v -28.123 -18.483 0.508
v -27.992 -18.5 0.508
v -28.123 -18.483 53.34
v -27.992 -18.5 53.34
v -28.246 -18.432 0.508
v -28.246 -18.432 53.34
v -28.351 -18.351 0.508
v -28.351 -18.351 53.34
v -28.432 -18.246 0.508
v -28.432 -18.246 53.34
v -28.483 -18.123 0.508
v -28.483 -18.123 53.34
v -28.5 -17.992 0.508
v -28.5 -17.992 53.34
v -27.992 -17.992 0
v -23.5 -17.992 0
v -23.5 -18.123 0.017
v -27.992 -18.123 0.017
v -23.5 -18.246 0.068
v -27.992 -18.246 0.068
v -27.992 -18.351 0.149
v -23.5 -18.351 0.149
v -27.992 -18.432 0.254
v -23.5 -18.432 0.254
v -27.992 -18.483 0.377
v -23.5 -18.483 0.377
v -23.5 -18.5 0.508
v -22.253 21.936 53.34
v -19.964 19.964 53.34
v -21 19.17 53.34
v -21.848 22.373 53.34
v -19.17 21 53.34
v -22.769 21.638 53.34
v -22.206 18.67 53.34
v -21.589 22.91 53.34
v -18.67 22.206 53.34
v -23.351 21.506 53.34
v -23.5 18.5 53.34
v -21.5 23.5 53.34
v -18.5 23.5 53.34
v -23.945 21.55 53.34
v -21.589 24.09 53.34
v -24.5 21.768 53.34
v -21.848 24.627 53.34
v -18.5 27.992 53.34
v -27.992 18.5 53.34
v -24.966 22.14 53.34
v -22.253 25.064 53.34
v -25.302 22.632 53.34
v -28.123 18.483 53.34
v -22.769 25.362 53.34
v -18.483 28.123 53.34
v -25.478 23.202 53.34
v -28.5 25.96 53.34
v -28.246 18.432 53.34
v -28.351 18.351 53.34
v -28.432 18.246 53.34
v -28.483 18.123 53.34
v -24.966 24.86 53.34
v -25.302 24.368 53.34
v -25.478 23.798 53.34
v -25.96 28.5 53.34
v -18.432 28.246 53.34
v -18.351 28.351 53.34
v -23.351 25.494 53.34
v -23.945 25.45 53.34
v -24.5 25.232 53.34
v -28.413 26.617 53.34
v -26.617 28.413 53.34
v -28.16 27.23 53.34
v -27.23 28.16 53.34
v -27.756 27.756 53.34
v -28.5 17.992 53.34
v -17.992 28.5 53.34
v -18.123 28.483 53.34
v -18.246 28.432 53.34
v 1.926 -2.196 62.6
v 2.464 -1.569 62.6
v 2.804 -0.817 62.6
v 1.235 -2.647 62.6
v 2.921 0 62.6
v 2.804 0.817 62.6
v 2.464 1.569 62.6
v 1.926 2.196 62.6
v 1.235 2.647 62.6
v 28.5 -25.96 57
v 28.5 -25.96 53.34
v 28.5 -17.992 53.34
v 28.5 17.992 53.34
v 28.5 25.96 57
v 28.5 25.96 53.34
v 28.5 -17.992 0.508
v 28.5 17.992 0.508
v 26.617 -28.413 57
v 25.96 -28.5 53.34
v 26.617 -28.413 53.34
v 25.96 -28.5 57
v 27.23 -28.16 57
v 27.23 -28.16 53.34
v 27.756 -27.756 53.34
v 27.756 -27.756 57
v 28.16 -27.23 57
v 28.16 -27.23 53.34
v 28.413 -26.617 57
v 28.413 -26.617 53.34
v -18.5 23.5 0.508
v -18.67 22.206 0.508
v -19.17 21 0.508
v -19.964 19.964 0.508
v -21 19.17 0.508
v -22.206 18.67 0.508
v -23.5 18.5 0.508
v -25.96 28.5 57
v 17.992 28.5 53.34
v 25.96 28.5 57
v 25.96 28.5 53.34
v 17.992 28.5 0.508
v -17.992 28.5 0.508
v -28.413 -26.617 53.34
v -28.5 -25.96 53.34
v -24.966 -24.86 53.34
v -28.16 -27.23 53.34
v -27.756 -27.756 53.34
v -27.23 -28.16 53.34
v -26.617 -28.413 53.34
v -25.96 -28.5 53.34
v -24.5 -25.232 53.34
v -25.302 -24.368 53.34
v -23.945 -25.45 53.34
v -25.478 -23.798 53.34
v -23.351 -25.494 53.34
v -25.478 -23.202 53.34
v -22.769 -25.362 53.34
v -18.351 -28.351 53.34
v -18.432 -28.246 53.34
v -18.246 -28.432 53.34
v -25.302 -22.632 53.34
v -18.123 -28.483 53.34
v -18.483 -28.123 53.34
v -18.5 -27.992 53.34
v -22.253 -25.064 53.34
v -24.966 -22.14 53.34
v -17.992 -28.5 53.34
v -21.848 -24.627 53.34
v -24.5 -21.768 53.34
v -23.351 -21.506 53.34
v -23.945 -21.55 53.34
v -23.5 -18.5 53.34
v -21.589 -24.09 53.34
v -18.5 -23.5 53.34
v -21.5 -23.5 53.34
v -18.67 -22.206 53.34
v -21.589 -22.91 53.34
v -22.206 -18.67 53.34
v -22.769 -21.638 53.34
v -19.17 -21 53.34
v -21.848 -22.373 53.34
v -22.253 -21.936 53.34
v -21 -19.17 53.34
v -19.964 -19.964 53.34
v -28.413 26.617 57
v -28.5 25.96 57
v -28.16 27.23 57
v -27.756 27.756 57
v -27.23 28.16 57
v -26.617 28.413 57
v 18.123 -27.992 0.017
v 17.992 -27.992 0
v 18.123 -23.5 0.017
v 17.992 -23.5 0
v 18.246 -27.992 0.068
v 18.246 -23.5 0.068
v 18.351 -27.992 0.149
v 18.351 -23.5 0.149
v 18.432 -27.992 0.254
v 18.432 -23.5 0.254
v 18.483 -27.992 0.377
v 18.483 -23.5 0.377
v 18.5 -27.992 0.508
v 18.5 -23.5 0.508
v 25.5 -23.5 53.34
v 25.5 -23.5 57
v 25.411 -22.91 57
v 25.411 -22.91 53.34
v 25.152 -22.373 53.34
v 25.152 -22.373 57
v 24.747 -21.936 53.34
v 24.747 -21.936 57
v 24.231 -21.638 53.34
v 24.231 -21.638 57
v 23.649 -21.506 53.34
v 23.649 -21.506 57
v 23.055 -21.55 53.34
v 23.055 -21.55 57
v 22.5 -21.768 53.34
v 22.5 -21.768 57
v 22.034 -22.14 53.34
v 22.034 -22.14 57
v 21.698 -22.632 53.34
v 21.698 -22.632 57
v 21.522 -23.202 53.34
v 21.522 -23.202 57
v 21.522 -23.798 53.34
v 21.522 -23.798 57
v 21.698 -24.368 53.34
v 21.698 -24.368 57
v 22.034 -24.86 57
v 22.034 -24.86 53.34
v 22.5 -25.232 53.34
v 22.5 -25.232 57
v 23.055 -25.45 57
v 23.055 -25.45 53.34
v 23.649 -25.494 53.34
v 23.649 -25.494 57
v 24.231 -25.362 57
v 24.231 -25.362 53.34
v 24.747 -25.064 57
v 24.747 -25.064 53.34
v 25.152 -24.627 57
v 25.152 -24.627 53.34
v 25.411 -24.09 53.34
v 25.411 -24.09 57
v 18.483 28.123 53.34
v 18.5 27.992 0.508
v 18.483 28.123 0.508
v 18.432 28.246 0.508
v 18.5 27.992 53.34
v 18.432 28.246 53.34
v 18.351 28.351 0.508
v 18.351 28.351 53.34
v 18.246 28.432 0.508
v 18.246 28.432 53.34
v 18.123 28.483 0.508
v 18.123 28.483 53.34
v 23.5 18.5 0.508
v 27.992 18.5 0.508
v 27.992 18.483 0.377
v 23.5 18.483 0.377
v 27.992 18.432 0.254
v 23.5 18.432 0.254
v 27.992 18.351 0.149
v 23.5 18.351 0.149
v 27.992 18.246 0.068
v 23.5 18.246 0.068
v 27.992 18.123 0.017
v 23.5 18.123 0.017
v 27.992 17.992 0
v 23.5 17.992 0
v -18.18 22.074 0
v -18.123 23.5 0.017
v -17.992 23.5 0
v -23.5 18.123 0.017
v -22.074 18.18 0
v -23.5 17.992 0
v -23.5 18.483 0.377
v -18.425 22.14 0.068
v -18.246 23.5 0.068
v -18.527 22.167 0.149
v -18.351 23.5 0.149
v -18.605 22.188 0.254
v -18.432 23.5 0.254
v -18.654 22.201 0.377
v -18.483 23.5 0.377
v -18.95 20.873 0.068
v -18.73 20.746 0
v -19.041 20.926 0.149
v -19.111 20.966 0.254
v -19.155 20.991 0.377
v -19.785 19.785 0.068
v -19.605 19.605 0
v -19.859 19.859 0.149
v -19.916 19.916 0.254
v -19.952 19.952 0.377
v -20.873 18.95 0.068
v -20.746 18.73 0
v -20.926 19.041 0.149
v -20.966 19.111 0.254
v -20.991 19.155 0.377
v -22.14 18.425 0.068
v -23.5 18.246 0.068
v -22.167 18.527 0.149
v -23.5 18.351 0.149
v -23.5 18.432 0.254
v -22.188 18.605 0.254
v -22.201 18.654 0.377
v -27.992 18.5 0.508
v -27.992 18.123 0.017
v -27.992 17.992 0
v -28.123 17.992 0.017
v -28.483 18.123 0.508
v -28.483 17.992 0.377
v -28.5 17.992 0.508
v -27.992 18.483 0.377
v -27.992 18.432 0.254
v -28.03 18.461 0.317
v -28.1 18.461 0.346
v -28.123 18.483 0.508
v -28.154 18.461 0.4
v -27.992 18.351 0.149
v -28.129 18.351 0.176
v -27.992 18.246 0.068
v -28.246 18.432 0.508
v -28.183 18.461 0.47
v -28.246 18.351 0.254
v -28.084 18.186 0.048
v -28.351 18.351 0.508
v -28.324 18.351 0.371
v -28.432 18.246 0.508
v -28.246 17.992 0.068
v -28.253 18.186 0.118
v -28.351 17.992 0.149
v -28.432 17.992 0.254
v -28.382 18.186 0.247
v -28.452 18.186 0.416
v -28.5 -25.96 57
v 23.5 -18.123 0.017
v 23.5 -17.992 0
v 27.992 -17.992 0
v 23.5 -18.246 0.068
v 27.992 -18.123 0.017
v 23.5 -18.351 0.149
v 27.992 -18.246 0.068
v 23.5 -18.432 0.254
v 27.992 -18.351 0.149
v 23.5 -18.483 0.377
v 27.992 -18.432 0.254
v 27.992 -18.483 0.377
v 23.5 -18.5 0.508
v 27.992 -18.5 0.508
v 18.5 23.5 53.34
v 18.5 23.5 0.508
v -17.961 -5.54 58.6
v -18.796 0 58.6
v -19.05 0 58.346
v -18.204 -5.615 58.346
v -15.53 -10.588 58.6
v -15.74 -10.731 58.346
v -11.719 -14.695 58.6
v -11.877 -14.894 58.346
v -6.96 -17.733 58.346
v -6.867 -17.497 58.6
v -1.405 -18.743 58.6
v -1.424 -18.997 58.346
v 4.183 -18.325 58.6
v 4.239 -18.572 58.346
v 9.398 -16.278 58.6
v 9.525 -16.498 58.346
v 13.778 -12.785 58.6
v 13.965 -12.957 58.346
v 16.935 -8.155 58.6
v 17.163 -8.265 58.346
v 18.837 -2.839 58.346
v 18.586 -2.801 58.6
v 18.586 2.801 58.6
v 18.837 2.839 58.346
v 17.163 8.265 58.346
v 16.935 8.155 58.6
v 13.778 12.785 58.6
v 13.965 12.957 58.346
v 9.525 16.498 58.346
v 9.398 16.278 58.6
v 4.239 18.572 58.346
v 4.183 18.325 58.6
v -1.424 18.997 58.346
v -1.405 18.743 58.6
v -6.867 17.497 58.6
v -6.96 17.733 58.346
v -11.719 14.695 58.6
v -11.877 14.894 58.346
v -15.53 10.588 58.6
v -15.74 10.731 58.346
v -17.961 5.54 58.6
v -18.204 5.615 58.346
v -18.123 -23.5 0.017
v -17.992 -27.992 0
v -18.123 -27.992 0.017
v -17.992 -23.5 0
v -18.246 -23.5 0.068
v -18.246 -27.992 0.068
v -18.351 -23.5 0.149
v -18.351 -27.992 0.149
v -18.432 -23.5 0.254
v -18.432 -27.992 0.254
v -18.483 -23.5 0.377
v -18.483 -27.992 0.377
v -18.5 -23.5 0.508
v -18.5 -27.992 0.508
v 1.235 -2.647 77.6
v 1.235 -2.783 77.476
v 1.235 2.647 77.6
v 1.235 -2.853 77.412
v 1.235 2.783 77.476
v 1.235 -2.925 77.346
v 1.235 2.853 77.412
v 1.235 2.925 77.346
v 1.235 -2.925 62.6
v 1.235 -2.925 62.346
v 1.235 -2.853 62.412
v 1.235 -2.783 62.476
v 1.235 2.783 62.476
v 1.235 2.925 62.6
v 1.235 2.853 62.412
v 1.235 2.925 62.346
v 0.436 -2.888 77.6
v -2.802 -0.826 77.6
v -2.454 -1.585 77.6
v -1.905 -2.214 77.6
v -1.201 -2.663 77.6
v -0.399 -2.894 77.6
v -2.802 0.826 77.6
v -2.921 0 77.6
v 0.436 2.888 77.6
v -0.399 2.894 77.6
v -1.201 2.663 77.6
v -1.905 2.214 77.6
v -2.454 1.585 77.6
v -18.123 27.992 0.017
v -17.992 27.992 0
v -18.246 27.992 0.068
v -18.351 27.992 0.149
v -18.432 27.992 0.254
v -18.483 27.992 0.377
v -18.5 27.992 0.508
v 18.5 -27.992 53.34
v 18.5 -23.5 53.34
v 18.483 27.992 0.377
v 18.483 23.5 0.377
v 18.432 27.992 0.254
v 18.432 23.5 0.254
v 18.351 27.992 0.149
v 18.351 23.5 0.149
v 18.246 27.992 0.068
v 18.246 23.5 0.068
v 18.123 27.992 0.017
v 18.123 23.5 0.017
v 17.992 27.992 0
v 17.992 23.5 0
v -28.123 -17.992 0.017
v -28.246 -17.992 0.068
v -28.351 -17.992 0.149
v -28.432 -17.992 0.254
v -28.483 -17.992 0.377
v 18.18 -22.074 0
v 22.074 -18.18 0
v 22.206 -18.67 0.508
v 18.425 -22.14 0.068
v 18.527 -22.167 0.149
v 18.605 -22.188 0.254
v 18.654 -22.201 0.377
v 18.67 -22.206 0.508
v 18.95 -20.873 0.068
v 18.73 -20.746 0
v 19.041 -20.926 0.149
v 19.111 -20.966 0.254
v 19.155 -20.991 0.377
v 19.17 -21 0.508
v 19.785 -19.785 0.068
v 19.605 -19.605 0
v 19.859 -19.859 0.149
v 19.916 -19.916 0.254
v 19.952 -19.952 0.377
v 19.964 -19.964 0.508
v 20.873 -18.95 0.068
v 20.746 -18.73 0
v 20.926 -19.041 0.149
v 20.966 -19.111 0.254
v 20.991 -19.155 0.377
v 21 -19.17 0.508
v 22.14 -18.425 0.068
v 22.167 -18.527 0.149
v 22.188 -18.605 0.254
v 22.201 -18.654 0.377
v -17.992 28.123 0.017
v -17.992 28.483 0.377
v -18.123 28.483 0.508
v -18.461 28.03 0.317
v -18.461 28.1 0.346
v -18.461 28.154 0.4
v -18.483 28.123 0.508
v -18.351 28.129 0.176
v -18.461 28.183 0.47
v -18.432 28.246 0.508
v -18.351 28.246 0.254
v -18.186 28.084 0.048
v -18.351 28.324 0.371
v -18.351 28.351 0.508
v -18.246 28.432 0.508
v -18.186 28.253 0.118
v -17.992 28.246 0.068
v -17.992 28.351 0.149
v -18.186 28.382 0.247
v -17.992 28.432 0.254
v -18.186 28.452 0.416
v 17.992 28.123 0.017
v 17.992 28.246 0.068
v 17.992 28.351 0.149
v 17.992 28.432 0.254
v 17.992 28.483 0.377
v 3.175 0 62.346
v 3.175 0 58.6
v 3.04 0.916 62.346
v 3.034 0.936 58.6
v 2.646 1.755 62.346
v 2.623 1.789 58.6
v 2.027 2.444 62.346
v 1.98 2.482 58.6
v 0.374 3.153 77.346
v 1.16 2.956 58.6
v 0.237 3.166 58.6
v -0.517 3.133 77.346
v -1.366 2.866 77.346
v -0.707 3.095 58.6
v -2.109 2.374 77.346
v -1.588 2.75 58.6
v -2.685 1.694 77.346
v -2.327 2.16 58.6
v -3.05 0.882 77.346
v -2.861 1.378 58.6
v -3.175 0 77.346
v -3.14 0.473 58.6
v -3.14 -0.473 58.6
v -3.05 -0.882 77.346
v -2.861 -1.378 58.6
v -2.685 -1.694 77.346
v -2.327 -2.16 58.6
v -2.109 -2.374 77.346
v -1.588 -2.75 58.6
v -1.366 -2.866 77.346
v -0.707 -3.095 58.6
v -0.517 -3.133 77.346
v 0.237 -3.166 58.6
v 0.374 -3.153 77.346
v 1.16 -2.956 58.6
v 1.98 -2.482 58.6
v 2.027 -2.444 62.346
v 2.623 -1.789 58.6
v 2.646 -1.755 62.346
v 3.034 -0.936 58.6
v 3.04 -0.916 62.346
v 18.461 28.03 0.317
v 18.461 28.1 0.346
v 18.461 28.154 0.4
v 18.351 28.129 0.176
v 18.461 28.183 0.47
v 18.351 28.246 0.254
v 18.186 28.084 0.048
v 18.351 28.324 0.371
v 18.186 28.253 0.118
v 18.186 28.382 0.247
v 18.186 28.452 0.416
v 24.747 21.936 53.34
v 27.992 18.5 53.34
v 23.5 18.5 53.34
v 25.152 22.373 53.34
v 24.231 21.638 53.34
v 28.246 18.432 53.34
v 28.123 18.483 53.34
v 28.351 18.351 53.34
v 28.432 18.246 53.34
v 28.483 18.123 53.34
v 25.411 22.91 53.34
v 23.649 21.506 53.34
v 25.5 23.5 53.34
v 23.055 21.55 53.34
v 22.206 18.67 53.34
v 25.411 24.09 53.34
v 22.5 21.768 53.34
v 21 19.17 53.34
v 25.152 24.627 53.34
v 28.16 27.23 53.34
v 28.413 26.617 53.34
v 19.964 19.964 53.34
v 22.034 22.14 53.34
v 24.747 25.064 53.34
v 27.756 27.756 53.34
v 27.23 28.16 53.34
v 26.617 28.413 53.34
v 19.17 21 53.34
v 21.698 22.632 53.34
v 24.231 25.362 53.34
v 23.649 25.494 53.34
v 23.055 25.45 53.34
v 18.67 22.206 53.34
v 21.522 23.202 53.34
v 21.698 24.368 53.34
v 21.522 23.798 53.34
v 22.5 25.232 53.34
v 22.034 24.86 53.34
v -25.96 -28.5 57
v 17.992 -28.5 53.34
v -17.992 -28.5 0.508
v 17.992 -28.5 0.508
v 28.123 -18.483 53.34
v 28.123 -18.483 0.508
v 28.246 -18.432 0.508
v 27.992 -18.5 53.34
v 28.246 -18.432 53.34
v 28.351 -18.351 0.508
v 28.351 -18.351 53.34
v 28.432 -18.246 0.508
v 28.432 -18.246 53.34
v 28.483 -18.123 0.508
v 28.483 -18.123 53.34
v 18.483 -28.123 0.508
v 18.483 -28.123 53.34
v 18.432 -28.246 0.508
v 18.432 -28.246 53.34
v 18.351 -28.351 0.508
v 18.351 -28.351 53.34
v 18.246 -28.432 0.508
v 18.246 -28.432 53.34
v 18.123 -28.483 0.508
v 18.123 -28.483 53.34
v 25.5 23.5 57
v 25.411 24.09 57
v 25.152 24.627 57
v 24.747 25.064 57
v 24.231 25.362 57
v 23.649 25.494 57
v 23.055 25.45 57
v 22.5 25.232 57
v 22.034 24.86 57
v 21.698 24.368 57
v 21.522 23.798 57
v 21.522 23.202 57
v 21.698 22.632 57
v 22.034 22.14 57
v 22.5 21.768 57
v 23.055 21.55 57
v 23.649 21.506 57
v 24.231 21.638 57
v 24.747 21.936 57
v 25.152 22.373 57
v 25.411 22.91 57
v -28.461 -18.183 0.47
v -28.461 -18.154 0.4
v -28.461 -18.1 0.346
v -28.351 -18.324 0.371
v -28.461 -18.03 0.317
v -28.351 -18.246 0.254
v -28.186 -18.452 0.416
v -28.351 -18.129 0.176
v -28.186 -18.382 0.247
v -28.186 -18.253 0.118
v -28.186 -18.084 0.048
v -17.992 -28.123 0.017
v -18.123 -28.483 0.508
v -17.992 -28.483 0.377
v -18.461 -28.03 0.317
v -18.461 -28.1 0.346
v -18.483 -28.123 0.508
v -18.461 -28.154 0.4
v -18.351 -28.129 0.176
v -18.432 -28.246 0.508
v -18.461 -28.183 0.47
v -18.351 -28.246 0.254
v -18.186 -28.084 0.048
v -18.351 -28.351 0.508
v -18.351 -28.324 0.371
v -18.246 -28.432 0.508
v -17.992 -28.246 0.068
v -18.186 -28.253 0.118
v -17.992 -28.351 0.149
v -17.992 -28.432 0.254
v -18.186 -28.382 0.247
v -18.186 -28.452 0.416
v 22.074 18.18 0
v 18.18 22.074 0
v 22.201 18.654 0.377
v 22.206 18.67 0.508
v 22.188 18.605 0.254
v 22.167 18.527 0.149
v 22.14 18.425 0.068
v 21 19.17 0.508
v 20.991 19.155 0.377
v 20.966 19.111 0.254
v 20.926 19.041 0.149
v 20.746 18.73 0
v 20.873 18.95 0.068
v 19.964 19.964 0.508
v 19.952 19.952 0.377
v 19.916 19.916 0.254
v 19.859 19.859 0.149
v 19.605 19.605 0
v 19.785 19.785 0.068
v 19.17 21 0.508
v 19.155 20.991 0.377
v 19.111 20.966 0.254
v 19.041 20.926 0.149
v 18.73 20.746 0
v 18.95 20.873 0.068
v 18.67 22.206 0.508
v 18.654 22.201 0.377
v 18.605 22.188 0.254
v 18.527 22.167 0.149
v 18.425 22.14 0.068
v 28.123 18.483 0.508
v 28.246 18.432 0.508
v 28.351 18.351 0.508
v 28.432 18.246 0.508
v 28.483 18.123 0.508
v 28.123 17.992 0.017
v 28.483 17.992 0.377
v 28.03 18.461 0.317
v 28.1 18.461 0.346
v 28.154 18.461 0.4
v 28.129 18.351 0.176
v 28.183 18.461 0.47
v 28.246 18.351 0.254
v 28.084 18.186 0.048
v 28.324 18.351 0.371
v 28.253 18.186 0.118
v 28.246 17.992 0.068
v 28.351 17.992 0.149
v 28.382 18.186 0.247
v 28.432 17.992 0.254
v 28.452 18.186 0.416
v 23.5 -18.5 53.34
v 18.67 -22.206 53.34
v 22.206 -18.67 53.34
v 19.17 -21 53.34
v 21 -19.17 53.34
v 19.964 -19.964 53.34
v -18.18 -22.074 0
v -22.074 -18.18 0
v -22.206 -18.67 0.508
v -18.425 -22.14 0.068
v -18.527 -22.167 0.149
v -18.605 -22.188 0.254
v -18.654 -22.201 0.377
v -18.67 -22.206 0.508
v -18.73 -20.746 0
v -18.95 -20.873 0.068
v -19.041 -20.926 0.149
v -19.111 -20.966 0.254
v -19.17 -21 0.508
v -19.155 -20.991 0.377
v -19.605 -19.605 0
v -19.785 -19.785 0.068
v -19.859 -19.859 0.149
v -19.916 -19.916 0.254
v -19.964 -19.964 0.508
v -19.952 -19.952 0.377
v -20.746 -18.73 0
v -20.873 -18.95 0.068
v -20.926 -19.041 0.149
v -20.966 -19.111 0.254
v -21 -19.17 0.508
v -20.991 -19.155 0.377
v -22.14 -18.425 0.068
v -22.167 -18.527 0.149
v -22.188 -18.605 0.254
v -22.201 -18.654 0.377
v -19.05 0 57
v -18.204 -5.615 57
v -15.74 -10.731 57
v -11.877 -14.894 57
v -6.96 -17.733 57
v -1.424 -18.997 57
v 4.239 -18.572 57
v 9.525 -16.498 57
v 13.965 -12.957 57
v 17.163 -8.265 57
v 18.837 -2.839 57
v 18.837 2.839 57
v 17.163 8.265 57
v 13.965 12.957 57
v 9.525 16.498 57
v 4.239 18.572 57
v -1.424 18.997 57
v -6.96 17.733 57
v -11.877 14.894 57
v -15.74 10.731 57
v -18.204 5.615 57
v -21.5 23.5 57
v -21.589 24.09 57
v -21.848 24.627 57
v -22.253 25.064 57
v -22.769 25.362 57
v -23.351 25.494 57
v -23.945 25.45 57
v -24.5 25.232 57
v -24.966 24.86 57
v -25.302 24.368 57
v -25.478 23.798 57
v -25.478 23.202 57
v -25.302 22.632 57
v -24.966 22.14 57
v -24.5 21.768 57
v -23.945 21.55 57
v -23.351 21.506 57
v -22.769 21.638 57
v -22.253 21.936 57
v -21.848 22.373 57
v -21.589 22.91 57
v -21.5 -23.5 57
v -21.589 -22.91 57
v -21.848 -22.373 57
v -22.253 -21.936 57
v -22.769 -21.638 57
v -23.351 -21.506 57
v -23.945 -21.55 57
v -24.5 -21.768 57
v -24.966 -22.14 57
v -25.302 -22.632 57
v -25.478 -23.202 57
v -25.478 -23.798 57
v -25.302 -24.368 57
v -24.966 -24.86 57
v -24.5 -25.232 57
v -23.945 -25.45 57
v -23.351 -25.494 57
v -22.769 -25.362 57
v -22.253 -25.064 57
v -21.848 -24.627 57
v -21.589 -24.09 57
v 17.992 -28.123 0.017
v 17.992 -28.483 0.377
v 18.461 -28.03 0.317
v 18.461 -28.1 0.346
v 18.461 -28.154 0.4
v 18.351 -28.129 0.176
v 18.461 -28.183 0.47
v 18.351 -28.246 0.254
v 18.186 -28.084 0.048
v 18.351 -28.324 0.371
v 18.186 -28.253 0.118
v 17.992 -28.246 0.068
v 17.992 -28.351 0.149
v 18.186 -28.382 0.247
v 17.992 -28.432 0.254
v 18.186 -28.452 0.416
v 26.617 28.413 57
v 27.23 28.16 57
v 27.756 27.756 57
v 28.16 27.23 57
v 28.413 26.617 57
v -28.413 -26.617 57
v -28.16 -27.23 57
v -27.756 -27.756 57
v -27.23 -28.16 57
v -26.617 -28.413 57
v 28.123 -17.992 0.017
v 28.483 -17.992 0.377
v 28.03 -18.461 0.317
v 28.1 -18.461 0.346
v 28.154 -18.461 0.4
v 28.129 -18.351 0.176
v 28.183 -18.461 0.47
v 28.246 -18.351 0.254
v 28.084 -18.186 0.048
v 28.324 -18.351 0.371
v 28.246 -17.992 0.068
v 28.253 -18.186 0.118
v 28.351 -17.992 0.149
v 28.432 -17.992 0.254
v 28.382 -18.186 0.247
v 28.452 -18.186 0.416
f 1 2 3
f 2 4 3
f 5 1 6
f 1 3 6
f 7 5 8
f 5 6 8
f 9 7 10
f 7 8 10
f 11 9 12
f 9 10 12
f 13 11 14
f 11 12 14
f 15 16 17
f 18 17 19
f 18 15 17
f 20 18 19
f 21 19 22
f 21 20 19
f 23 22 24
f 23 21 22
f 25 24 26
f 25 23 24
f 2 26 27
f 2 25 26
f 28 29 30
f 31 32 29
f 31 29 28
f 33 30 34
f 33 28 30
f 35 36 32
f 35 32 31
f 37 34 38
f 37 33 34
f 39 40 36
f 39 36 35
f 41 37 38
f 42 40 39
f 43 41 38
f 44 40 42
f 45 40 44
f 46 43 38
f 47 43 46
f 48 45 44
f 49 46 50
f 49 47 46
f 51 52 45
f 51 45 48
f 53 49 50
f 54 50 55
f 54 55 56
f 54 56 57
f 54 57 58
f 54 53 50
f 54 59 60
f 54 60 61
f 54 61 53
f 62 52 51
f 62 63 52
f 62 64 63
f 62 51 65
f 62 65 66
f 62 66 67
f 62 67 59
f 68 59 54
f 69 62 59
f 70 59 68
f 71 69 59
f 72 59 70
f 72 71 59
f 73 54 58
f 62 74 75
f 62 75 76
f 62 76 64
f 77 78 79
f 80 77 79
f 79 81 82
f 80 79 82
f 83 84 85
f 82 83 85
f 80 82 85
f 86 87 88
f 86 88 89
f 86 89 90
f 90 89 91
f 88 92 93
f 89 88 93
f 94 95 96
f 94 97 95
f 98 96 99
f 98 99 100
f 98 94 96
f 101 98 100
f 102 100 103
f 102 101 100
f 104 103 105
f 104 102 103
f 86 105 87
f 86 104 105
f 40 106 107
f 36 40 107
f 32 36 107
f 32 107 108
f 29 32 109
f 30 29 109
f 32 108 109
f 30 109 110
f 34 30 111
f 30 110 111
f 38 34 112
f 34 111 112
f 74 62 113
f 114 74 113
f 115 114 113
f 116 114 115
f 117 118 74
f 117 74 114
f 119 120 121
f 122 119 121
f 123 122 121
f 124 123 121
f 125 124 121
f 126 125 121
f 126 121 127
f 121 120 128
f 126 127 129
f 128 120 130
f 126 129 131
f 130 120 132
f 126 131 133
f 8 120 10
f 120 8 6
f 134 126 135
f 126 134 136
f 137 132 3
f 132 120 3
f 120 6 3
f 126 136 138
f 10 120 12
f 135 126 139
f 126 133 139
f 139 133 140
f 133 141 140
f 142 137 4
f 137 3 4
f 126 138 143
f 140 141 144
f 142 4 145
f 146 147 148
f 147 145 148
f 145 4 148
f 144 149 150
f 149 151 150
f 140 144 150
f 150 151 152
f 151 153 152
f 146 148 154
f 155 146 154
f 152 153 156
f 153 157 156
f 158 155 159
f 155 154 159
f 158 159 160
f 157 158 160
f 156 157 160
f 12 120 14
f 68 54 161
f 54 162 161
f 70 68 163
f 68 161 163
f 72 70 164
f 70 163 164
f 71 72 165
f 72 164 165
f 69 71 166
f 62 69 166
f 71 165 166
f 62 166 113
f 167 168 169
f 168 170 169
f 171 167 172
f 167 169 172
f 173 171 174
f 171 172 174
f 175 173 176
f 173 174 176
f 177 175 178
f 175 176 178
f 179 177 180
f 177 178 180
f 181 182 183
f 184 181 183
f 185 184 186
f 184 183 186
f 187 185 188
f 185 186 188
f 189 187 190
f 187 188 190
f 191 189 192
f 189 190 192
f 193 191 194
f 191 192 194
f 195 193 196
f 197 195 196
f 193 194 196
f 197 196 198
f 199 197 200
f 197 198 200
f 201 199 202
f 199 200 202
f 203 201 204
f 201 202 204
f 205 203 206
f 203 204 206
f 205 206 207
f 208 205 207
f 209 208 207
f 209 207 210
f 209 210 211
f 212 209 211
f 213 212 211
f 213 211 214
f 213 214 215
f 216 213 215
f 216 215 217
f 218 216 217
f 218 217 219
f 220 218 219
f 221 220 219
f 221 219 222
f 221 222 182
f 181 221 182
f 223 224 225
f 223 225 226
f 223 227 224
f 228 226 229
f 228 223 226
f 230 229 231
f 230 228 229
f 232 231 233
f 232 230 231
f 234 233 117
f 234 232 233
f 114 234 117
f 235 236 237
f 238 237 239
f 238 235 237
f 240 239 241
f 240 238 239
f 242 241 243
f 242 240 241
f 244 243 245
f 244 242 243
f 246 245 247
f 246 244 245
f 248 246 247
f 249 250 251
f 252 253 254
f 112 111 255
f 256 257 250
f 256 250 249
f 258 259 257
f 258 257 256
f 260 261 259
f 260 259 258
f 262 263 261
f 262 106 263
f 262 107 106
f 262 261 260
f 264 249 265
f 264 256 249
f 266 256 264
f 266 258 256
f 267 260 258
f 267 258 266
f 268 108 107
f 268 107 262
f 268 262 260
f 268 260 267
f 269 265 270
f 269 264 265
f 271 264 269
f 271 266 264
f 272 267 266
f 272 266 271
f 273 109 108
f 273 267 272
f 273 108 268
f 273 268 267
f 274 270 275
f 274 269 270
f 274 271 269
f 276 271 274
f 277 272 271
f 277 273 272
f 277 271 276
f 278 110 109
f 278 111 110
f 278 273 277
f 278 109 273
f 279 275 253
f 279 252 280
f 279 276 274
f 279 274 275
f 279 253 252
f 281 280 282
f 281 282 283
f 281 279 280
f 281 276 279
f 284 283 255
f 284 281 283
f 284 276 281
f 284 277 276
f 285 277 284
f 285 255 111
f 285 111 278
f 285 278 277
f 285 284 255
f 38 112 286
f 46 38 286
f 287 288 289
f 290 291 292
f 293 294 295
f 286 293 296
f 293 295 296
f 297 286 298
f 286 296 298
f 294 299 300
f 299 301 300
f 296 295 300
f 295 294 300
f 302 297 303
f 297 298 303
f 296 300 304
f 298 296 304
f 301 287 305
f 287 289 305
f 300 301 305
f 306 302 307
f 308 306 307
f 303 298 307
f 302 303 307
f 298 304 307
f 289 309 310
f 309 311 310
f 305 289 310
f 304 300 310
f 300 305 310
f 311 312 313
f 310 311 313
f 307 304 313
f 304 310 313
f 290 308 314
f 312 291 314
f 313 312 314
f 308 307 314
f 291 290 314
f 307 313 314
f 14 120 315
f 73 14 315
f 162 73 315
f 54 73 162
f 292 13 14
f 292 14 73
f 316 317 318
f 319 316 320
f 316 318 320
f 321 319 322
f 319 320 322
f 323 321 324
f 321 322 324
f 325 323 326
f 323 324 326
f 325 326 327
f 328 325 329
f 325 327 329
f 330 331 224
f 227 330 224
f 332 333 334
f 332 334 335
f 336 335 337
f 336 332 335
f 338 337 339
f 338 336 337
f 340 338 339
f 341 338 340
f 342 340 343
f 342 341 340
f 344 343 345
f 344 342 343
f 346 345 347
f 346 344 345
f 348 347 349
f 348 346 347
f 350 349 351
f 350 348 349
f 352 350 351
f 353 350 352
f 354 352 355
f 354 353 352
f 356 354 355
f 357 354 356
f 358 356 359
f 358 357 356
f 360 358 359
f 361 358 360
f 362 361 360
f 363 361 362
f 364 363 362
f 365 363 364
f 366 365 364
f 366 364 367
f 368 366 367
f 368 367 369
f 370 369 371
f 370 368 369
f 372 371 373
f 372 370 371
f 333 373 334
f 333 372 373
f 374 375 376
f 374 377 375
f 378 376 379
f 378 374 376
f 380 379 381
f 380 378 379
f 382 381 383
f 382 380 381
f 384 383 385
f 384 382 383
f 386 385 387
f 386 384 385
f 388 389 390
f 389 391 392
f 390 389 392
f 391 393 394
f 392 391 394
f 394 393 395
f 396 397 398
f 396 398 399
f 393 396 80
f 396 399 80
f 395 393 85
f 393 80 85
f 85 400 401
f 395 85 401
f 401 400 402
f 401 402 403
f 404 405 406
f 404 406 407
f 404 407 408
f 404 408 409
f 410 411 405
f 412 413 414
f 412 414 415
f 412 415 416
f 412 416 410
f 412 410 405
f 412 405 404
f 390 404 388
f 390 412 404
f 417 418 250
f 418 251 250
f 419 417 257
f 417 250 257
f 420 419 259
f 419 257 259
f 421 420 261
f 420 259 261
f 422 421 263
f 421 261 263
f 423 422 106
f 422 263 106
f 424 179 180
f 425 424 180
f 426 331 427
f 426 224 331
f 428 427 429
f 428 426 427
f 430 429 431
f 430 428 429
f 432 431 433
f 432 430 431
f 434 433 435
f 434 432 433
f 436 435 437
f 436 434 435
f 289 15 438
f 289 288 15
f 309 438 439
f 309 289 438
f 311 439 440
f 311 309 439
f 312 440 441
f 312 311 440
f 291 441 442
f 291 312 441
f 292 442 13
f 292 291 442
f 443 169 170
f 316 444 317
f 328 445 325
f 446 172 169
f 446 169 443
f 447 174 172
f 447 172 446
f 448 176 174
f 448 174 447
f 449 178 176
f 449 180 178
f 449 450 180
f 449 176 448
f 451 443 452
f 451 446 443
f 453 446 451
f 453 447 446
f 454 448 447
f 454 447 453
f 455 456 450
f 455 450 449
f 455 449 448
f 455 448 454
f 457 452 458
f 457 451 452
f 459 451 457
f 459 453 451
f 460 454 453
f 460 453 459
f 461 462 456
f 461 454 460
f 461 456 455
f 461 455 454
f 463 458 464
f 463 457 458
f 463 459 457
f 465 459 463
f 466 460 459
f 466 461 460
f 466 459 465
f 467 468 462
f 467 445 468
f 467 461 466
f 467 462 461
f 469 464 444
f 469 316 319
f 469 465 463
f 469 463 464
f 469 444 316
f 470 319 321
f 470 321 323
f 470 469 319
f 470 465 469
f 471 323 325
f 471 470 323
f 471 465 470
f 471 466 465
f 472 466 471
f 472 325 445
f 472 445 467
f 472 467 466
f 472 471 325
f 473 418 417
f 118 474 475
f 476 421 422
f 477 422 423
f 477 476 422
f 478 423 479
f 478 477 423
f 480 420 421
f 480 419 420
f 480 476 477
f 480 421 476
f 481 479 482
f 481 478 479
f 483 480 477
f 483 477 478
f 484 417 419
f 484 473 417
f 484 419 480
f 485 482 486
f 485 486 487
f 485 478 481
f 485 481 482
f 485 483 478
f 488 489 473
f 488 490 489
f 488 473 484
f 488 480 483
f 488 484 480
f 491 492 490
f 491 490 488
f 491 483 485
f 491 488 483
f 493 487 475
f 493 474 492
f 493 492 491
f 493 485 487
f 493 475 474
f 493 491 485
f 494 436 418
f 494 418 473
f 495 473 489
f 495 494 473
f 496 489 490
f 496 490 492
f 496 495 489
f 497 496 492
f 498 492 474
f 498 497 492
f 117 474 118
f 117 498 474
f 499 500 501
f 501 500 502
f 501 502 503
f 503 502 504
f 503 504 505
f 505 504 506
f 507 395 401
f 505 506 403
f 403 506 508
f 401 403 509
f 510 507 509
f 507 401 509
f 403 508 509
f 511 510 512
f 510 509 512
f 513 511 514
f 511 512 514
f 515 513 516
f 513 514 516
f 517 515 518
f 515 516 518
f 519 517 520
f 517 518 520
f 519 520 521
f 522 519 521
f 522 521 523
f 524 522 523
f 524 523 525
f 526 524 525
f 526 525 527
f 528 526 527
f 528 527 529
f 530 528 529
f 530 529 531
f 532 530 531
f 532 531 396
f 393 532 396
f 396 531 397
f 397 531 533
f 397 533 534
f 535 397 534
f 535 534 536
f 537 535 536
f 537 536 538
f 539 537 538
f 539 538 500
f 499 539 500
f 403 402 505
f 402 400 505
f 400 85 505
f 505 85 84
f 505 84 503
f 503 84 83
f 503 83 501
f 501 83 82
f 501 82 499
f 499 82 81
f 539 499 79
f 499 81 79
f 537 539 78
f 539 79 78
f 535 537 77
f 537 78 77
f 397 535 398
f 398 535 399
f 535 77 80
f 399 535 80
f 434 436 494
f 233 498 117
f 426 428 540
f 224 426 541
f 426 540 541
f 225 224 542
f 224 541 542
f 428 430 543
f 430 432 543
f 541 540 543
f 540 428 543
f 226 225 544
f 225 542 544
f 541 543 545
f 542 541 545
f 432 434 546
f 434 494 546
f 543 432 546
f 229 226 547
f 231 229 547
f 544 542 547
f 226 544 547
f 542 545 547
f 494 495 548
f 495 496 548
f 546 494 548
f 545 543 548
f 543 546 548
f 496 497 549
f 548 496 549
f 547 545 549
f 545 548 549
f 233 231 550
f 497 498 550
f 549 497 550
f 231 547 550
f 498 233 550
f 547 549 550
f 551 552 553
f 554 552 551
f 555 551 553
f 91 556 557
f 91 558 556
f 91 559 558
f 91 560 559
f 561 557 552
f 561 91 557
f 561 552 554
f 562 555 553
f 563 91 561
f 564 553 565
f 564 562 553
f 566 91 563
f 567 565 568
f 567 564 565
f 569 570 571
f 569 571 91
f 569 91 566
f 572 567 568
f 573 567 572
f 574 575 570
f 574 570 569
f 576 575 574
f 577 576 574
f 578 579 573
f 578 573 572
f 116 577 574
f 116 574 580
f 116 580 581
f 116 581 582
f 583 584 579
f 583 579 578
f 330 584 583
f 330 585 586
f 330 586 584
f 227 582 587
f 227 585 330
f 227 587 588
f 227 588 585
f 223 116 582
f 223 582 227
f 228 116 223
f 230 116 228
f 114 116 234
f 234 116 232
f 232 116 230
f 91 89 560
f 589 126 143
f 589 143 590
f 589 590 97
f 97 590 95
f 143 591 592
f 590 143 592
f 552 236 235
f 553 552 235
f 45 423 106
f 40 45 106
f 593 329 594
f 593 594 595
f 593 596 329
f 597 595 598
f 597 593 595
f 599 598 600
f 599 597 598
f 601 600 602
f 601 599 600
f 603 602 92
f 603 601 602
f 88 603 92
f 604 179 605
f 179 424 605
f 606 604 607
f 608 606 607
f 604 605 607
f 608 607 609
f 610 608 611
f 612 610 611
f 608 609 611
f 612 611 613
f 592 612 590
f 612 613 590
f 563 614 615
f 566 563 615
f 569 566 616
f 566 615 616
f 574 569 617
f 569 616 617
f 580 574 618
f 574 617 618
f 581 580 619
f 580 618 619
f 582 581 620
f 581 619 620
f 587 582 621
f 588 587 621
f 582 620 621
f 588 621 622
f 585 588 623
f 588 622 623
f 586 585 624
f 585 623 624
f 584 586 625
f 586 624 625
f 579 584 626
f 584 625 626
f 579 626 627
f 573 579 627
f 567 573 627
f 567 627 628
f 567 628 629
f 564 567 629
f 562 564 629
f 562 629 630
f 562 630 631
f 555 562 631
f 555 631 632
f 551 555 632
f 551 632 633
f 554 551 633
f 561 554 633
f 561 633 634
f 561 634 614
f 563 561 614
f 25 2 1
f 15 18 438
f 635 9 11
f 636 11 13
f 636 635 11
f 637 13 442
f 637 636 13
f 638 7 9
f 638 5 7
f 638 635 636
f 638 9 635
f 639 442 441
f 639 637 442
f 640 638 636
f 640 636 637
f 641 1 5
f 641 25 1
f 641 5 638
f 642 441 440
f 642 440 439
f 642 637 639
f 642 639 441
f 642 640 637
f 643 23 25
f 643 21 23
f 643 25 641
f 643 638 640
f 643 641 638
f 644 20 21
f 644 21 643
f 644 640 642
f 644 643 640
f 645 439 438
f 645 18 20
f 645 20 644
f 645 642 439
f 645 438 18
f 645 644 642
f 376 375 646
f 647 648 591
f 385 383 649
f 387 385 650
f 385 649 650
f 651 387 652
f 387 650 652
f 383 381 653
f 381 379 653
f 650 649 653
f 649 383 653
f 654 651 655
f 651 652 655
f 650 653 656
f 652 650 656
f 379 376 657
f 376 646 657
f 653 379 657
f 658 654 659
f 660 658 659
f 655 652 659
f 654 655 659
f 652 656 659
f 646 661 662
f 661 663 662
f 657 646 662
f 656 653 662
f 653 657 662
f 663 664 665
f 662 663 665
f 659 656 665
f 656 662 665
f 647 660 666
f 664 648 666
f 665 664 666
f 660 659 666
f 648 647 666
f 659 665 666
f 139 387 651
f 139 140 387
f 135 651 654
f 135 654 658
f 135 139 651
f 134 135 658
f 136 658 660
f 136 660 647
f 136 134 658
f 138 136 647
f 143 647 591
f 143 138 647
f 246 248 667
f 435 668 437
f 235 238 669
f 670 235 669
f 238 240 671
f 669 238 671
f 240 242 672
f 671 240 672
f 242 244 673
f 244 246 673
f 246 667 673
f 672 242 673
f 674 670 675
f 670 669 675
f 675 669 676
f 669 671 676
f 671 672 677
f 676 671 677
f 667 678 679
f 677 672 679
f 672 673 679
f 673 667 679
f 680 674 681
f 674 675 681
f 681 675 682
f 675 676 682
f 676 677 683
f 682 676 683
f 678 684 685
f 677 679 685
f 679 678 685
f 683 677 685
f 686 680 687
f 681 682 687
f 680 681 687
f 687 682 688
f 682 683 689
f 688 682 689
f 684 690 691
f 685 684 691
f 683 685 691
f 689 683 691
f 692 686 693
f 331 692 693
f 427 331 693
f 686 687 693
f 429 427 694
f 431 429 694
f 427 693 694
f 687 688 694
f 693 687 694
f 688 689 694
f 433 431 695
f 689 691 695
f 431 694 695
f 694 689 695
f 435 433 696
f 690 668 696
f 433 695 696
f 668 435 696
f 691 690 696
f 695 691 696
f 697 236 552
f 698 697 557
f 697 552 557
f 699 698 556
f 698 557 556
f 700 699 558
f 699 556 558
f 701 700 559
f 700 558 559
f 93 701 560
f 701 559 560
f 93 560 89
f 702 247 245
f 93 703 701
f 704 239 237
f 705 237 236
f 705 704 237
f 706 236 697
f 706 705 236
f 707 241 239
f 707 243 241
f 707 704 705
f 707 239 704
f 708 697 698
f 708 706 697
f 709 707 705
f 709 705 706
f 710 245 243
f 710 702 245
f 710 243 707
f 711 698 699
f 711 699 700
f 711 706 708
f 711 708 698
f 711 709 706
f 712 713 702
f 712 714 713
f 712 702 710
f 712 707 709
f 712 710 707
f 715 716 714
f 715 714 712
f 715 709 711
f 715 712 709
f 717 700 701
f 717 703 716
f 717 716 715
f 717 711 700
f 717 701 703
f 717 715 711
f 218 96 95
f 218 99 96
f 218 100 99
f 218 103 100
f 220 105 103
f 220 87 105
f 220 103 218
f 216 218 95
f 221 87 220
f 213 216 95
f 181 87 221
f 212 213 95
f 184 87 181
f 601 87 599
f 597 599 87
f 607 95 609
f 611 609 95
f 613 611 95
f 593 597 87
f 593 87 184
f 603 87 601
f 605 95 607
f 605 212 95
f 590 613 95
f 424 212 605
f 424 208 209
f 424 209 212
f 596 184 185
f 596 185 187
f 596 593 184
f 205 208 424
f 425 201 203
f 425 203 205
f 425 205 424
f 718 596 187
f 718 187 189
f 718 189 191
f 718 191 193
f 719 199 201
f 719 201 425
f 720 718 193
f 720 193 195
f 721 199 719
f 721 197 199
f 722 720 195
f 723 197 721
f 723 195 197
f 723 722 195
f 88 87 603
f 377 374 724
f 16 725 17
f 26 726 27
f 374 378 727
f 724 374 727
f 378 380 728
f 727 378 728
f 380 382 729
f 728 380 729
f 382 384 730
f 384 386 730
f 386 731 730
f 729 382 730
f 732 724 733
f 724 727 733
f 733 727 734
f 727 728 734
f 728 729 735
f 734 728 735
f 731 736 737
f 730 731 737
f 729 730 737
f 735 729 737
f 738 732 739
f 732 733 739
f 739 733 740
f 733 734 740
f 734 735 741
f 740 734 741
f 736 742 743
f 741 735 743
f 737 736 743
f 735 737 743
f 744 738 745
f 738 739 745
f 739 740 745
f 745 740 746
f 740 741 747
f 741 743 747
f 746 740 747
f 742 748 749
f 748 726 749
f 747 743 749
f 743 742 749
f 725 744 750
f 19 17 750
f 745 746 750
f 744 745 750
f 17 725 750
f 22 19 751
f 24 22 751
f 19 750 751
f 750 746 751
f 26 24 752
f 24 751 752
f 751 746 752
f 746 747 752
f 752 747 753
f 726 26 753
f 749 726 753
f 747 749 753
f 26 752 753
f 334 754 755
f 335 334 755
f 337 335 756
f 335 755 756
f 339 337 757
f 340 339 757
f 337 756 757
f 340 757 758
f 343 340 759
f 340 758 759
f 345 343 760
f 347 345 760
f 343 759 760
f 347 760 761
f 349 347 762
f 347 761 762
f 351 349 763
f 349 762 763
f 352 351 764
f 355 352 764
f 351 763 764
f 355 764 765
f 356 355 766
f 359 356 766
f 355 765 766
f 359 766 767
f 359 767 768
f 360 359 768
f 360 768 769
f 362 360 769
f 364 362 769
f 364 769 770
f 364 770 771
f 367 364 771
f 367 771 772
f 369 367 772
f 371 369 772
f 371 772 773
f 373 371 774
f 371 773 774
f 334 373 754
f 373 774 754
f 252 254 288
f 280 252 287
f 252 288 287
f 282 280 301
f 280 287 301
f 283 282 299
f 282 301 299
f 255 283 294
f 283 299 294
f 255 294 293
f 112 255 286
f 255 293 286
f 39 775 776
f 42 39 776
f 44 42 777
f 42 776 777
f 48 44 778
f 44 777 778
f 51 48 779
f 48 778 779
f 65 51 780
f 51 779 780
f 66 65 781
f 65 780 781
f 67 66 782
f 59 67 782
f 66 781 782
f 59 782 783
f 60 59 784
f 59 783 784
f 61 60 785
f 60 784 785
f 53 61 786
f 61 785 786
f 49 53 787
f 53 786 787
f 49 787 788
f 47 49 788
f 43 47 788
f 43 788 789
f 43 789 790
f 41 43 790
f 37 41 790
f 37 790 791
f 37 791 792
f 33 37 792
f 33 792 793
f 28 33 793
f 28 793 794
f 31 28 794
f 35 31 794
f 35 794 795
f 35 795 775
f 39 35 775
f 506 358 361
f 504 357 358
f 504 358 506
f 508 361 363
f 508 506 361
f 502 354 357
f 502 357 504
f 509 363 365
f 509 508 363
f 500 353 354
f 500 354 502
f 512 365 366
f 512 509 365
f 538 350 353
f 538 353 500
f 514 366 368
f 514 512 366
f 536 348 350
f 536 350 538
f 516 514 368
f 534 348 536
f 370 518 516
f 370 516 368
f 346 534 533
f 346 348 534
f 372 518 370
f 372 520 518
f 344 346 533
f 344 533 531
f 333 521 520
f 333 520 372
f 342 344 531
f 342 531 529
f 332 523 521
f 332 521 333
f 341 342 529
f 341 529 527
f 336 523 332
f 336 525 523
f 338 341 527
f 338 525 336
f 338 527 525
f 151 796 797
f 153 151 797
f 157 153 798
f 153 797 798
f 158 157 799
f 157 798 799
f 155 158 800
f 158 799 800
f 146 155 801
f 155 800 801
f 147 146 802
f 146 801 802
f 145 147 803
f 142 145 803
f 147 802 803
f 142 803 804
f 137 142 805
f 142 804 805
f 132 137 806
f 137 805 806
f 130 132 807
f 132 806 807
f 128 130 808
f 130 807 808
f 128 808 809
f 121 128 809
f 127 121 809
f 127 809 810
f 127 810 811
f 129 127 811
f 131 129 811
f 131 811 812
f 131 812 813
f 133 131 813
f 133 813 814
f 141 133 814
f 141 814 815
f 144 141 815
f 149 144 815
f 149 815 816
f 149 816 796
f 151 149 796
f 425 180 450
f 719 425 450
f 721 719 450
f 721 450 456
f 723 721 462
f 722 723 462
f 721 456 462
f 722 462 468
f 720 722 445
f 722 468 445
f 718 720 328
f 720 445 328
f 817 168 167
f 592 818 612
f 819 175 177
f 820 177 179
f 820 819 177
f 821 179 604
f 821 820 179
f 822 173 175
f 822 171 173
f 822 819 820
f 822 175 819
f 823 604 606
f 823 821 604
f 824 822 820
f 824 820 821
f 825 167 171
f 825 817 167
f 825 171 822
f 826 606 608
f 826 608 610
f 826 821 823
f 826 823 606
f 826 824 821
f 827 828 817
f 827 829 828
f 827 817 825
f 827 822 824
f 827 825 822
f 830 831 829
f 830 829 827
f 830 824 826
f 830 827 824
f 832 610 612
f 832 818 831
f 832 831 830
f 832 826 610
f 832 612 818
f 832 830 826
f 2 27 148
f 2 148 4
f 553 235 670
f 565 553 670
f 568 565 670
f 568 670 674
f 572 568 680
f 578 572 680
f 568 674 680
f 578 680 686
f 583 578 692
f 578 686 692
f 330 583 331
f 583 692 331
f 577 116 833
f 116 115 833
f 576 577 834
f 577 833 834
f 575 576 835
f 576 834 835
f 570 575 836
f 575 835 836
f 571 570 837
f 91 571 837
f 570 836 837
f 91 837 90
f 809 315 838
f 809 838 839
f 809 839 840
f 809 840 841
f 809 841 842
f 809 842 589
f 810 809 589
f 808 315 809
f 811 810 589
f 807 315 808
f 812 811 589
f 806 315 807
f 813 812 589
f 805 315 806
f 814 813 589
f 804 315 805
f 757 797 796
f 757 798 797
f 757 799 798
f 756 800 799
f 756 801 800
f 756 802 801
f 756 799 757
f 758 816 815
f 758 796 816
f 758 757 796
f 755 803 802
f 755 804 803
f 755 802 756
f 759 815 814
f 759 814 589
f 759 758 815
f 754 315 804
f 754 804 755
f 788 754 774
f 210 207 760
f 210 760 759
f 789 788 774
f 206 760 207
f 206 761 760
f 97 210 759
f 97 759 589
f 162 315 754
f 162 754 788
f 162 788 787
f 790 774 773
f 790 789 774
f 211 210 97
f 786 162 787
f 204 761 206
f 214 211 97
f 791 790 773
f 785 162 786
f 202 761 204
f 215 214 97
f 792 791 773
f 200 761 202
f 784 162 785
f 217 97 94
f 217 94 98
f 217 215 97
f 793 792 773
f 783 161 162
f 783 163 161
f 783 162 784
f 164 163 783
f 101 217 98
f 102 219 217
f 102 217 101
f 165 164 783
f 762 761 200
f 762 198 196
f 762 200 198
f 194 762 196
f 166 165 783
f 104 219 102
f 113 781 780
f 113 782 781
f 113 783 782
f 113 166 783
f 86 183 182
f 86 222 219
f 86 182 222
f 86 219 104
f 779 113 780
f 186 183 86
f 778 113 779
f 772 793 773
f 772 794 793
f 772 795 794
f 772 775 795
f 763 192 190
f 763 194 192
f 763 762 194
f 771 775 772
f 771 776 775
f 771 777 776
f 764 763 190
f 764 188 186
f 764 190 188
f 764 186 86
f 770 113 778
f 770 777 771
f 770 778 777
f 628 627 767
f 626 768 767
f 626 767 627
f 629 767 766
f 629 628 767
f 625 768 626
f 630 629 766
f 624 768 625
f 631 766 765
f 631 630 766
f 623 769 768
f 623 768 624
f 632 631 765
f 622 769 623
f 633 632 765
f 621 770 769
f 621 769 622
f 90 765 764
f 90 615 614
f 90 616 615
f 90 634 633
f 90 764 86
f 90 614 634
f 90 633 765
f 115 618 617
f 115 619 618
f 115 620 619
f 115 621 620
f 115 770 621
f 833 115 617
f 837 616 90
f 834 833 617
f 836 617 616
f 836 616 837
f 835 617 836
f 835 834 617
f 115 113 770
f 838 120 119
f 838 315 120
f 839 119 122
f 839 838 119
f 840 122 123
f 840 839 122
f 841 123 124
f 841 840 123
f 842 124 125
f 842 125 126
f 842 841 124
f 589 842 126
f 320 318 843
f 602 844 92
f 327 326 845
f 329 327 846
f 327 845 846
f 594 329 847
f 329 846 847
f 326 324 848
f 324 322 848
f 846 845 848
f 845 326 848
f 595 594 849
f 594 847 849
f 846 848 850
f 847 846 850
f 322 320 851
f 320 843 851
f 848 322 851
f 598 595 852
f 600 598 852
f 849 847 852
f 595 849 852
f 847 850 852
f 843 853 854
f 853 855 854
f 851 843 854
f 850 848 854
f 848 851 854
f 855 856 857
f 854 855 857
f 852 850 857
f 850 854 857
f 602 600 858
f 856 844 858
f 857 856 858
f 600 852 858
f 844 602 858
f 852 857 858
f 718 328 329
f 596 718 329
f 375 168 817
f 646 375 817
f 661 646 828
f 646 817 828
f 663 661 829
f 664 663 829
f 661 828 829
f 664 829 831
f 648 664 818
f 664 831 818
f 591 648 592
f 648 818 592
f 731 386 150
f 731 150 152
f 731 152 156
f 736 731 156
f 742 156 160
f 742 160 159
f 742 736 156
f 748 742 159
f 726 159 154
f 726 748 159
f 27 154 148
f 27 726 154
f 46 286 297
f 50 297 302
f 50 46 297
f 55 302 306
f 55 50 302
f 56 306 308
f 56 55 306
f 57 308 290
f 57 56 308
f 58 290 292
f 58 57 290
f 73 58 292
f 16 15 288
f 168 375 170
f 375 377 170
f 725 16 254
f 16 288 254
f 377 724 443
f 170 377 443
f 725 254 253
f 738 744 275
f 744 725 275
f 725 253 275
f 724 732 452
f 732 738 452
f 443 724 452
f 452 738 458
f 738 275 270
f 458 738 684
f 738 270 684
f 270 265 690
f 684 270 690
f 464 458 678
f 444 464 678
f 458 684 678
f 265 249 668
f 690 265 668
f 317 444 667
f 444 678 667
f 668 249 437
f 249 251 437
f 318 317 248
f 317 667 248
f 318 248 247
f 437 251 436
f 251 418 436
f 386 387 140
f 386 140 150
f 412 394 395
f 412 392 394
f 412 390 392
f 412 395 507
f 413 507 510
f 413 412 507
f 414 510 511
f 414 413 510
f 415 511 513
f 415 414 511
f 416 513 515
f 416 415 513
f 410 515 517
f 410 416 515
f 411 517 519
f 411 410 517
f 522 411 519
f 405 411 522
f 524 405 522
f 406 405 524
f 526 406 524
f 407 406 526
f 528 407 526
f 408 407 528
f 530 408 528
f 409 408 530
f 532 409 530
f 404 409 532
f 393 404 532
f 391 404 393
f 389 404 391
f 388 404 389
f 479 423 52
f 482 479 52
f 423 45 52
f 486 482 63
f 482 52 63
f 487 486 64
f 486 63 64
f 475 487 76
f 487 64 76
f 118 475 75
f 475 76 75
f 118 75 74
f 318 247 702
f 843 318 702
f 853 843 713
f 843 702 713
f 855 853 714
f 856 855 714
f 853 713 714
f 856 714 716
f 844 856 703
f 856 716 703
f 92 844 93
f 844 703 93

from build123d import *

# Parameters (mm, degrees)
SKETCH1_W           = 57
SKETCH1_H           = 57
BOSS_EXTRUDE1_DEPTH = 57
SKETCH2_R           = 2
CUT_EXTRUDE1_DEPTH  = 70.810457669
CUT_EXTRUDE4_DEPTH  = 53.34
FILLET1_R           = 2.54
SKETCH9_R           = 19.05
BOSS_EXTRUDE2_DEPTH = 1.6
SKETCH10_R          = 3.175
BOSS_EXTRUDE3_DEPTH = 19
CUT_EXTRUDE5_START  = -15
CUT_EXTRUDE5_DEPTH  = 15
CHAMFER1_SIZE       = 0.254
FILLET2_R           = 0.508


with BuildPart() as part:
    # Sketch1 → Boss-Extrude1 (new body)
    with BuildSketch(Plane.XY):
        Rectangle(SKETCH1_W, SKETCH1_H)
    extrude(amount=BOSS_EXTRUDE1_DEPTH)

    # Sketch2 → Cut-Extrude1 (cut, through all)
    with BuildSketch(Plane.XY.offset(57)):
        with Locations((-23.5, 23.5)):
            Circle(SKETCH2_R)
        with Locations((23.5, 23.5)):
            Circle(SKETCH2_R)
        with Locations((23.5, -23.5)):
            Circle(SKETCH2_R)
        with Locations((-23.5, -23.5)):
            Circle(SKETCH2_R)
    extrude(amount=-CUT_EXTRUDE1_DEPTH, mode=Mode.SUBTRACT)

    # Sketch8 → Cut-Extrude4 (cut)
    with BuildSketch(Plane(origin=(0, 0, 0), x_dir=(-1, 0, 0), z_dir=(0, 0, -1))):
        with BuildLine():
            Line((18.5, -28.5), (18.5, -23.5))
            ThreePointArc((18.5, -23.5), (19.964466094, -19.964466094), (23.5, -18.5))
            Line((23.5, -18.5), (28.5, -18.5))
            Line((28.5, -18.5), (28.5, -28.5))
            Line((28.5, -28.5), (18.5, -28.5))
        make_face()
        with BuildLine():
            Line((23.5, 18.5), (28.5, 18.5))
            Line((28.5, 18.5), (28.5, 28.5))
            Line((28.5, 28.5), (18.5, 28.5))
            Line((18.5, 28.5), (18.5, 23.5))
            ThreePointArc((18.5, 23.5), (19.964466094, 19.964466094), (23.5, 18.5))
        make_face()
        with BuildLine():
            Line((-18.5, 23.5), (-18.5, 28.5))
            Line((-18.5, 28.5), (-28.5, 28.5))
            Line((-28.5, 28.5), (-28.5, 18.5))
            Line((-28.5, 18.5), (-23.5, 18.5))
            ThreePointArc((-23.5, 18.5), (-19.964466094, 19.964466094), (-18.5, 23.5))
        make_face()
        with BuildLine():
            Line((-23.5, -18.5), (-28.5, -18.5))
            Line((-28.5, -18.5), (-28.5, -28.5))
            Line((-28.5, -28.5), (-18.5, -28.5))
            Line((-18.5, -28.5), (-18.5, -23.5))
            ThreePointArc((-18.5, -23.5), (-19.964466094, -19.964466094), (-23.5, -18.5))
        make_face()
    extrude(amount=-CUT_EXTRUDE4_DEPTH, mode=Mode.SUBTRACT)

    # Fillet1
    fillet1_edges = [part.edges().sort_by_distance(p)[0] for p in [
        (28.5, -28.5, 55.17),
        (-28.5, -28.5, 55.17),
        (-28.5, 28.5, 55.17),
        (28.5, 28.5, 55.17),
    ]]
    fillet(fillet1_edges, radius=FILLET1_R)

    # Sketch9 → Boss-Extrude2 (add)
    with BuildSketch(Plane.XY.offset(57)):
        with Locations(Location((0, 0, 0), (0, 0, 180))):
            Circle(SKETCH9_R)
    extrude(amount=BOSS_EXTRUDE2_DEPTH)

    # Sketch10 → Boss-Extrude3 (add)
    with BuildSketch(Plane.XY.offset(58.6)):
        Circle(SKETCH10_R)
    extrude(amount=BOSS_EXTRUDE3_DEPTH)

    # Sketch11 → Cut-Extrude5 (cut)
    with BuildSketch(Plane.XY.offset(77.6).offset(CUT_EXTRUDE5_START)):
        with BuildLine():
            Line((1.234908904, -2.925), (1.234908904, 2.925))
            ThreePointArc((1.234908904, 2.925), (3.175, 0), (1.234908904, -2.925))
        make_face()
    extrude(amount=CUT_EXTRUDE5_DEPTH, mode=Mode.SUBTRACT)

    # Chamfer1
    chamfer1_edges = [part.edges().sort_by_distance(p)[0] for p in [
        (19.05, 0, 58.6),
        (-3.175, 0, 77.6),
        (2.645889337, -1.754962853, 62.6),
    ]]
    chamfer(chamfer1_edges, length=CHAMFER1_SIZE)

    # Fillet2
    fillet2_edges = [part.edges().sort_by_distance(p)[0] for p in [
        (0, -28.5, 0),
        (-26, -18.5, 0),
        (-19.964466094, -19.964466094, 0),
        (-18.5, -26, 0),
        (-18.5, -28.5, 26.67),
        (-28.5, -18.5, 26.67),
        (-28.5, 0, 0),
        (0, 28.5, 0),
        (28.5, 0, 0),
        (18.5, -26, 0),
        (19.964466094, -19.964466094, 0),
        (26, -18.5, 0),
        (28.5, -18.5, 26.67),
        (18.5, -28.5, 26.67),
        (26, 18.5, 0),
        (19.964466094, 19.964466094, 0),
        (18.5, 26, 0),
        (18.5, 28.5, 26.67),
        (28.5, 18.5, 26.67),
        (-19.964466094, 19.964466094, 0),
        (-26, 18.5, 0),
        (-18.5, 26, 0),
        (-18.5, 28.5, 26.67),
        (-28.5, 18.5, 26.67),
    ]]
    fillet(fillet2_edges, radius=FILLET2_R)


solid = part.part
